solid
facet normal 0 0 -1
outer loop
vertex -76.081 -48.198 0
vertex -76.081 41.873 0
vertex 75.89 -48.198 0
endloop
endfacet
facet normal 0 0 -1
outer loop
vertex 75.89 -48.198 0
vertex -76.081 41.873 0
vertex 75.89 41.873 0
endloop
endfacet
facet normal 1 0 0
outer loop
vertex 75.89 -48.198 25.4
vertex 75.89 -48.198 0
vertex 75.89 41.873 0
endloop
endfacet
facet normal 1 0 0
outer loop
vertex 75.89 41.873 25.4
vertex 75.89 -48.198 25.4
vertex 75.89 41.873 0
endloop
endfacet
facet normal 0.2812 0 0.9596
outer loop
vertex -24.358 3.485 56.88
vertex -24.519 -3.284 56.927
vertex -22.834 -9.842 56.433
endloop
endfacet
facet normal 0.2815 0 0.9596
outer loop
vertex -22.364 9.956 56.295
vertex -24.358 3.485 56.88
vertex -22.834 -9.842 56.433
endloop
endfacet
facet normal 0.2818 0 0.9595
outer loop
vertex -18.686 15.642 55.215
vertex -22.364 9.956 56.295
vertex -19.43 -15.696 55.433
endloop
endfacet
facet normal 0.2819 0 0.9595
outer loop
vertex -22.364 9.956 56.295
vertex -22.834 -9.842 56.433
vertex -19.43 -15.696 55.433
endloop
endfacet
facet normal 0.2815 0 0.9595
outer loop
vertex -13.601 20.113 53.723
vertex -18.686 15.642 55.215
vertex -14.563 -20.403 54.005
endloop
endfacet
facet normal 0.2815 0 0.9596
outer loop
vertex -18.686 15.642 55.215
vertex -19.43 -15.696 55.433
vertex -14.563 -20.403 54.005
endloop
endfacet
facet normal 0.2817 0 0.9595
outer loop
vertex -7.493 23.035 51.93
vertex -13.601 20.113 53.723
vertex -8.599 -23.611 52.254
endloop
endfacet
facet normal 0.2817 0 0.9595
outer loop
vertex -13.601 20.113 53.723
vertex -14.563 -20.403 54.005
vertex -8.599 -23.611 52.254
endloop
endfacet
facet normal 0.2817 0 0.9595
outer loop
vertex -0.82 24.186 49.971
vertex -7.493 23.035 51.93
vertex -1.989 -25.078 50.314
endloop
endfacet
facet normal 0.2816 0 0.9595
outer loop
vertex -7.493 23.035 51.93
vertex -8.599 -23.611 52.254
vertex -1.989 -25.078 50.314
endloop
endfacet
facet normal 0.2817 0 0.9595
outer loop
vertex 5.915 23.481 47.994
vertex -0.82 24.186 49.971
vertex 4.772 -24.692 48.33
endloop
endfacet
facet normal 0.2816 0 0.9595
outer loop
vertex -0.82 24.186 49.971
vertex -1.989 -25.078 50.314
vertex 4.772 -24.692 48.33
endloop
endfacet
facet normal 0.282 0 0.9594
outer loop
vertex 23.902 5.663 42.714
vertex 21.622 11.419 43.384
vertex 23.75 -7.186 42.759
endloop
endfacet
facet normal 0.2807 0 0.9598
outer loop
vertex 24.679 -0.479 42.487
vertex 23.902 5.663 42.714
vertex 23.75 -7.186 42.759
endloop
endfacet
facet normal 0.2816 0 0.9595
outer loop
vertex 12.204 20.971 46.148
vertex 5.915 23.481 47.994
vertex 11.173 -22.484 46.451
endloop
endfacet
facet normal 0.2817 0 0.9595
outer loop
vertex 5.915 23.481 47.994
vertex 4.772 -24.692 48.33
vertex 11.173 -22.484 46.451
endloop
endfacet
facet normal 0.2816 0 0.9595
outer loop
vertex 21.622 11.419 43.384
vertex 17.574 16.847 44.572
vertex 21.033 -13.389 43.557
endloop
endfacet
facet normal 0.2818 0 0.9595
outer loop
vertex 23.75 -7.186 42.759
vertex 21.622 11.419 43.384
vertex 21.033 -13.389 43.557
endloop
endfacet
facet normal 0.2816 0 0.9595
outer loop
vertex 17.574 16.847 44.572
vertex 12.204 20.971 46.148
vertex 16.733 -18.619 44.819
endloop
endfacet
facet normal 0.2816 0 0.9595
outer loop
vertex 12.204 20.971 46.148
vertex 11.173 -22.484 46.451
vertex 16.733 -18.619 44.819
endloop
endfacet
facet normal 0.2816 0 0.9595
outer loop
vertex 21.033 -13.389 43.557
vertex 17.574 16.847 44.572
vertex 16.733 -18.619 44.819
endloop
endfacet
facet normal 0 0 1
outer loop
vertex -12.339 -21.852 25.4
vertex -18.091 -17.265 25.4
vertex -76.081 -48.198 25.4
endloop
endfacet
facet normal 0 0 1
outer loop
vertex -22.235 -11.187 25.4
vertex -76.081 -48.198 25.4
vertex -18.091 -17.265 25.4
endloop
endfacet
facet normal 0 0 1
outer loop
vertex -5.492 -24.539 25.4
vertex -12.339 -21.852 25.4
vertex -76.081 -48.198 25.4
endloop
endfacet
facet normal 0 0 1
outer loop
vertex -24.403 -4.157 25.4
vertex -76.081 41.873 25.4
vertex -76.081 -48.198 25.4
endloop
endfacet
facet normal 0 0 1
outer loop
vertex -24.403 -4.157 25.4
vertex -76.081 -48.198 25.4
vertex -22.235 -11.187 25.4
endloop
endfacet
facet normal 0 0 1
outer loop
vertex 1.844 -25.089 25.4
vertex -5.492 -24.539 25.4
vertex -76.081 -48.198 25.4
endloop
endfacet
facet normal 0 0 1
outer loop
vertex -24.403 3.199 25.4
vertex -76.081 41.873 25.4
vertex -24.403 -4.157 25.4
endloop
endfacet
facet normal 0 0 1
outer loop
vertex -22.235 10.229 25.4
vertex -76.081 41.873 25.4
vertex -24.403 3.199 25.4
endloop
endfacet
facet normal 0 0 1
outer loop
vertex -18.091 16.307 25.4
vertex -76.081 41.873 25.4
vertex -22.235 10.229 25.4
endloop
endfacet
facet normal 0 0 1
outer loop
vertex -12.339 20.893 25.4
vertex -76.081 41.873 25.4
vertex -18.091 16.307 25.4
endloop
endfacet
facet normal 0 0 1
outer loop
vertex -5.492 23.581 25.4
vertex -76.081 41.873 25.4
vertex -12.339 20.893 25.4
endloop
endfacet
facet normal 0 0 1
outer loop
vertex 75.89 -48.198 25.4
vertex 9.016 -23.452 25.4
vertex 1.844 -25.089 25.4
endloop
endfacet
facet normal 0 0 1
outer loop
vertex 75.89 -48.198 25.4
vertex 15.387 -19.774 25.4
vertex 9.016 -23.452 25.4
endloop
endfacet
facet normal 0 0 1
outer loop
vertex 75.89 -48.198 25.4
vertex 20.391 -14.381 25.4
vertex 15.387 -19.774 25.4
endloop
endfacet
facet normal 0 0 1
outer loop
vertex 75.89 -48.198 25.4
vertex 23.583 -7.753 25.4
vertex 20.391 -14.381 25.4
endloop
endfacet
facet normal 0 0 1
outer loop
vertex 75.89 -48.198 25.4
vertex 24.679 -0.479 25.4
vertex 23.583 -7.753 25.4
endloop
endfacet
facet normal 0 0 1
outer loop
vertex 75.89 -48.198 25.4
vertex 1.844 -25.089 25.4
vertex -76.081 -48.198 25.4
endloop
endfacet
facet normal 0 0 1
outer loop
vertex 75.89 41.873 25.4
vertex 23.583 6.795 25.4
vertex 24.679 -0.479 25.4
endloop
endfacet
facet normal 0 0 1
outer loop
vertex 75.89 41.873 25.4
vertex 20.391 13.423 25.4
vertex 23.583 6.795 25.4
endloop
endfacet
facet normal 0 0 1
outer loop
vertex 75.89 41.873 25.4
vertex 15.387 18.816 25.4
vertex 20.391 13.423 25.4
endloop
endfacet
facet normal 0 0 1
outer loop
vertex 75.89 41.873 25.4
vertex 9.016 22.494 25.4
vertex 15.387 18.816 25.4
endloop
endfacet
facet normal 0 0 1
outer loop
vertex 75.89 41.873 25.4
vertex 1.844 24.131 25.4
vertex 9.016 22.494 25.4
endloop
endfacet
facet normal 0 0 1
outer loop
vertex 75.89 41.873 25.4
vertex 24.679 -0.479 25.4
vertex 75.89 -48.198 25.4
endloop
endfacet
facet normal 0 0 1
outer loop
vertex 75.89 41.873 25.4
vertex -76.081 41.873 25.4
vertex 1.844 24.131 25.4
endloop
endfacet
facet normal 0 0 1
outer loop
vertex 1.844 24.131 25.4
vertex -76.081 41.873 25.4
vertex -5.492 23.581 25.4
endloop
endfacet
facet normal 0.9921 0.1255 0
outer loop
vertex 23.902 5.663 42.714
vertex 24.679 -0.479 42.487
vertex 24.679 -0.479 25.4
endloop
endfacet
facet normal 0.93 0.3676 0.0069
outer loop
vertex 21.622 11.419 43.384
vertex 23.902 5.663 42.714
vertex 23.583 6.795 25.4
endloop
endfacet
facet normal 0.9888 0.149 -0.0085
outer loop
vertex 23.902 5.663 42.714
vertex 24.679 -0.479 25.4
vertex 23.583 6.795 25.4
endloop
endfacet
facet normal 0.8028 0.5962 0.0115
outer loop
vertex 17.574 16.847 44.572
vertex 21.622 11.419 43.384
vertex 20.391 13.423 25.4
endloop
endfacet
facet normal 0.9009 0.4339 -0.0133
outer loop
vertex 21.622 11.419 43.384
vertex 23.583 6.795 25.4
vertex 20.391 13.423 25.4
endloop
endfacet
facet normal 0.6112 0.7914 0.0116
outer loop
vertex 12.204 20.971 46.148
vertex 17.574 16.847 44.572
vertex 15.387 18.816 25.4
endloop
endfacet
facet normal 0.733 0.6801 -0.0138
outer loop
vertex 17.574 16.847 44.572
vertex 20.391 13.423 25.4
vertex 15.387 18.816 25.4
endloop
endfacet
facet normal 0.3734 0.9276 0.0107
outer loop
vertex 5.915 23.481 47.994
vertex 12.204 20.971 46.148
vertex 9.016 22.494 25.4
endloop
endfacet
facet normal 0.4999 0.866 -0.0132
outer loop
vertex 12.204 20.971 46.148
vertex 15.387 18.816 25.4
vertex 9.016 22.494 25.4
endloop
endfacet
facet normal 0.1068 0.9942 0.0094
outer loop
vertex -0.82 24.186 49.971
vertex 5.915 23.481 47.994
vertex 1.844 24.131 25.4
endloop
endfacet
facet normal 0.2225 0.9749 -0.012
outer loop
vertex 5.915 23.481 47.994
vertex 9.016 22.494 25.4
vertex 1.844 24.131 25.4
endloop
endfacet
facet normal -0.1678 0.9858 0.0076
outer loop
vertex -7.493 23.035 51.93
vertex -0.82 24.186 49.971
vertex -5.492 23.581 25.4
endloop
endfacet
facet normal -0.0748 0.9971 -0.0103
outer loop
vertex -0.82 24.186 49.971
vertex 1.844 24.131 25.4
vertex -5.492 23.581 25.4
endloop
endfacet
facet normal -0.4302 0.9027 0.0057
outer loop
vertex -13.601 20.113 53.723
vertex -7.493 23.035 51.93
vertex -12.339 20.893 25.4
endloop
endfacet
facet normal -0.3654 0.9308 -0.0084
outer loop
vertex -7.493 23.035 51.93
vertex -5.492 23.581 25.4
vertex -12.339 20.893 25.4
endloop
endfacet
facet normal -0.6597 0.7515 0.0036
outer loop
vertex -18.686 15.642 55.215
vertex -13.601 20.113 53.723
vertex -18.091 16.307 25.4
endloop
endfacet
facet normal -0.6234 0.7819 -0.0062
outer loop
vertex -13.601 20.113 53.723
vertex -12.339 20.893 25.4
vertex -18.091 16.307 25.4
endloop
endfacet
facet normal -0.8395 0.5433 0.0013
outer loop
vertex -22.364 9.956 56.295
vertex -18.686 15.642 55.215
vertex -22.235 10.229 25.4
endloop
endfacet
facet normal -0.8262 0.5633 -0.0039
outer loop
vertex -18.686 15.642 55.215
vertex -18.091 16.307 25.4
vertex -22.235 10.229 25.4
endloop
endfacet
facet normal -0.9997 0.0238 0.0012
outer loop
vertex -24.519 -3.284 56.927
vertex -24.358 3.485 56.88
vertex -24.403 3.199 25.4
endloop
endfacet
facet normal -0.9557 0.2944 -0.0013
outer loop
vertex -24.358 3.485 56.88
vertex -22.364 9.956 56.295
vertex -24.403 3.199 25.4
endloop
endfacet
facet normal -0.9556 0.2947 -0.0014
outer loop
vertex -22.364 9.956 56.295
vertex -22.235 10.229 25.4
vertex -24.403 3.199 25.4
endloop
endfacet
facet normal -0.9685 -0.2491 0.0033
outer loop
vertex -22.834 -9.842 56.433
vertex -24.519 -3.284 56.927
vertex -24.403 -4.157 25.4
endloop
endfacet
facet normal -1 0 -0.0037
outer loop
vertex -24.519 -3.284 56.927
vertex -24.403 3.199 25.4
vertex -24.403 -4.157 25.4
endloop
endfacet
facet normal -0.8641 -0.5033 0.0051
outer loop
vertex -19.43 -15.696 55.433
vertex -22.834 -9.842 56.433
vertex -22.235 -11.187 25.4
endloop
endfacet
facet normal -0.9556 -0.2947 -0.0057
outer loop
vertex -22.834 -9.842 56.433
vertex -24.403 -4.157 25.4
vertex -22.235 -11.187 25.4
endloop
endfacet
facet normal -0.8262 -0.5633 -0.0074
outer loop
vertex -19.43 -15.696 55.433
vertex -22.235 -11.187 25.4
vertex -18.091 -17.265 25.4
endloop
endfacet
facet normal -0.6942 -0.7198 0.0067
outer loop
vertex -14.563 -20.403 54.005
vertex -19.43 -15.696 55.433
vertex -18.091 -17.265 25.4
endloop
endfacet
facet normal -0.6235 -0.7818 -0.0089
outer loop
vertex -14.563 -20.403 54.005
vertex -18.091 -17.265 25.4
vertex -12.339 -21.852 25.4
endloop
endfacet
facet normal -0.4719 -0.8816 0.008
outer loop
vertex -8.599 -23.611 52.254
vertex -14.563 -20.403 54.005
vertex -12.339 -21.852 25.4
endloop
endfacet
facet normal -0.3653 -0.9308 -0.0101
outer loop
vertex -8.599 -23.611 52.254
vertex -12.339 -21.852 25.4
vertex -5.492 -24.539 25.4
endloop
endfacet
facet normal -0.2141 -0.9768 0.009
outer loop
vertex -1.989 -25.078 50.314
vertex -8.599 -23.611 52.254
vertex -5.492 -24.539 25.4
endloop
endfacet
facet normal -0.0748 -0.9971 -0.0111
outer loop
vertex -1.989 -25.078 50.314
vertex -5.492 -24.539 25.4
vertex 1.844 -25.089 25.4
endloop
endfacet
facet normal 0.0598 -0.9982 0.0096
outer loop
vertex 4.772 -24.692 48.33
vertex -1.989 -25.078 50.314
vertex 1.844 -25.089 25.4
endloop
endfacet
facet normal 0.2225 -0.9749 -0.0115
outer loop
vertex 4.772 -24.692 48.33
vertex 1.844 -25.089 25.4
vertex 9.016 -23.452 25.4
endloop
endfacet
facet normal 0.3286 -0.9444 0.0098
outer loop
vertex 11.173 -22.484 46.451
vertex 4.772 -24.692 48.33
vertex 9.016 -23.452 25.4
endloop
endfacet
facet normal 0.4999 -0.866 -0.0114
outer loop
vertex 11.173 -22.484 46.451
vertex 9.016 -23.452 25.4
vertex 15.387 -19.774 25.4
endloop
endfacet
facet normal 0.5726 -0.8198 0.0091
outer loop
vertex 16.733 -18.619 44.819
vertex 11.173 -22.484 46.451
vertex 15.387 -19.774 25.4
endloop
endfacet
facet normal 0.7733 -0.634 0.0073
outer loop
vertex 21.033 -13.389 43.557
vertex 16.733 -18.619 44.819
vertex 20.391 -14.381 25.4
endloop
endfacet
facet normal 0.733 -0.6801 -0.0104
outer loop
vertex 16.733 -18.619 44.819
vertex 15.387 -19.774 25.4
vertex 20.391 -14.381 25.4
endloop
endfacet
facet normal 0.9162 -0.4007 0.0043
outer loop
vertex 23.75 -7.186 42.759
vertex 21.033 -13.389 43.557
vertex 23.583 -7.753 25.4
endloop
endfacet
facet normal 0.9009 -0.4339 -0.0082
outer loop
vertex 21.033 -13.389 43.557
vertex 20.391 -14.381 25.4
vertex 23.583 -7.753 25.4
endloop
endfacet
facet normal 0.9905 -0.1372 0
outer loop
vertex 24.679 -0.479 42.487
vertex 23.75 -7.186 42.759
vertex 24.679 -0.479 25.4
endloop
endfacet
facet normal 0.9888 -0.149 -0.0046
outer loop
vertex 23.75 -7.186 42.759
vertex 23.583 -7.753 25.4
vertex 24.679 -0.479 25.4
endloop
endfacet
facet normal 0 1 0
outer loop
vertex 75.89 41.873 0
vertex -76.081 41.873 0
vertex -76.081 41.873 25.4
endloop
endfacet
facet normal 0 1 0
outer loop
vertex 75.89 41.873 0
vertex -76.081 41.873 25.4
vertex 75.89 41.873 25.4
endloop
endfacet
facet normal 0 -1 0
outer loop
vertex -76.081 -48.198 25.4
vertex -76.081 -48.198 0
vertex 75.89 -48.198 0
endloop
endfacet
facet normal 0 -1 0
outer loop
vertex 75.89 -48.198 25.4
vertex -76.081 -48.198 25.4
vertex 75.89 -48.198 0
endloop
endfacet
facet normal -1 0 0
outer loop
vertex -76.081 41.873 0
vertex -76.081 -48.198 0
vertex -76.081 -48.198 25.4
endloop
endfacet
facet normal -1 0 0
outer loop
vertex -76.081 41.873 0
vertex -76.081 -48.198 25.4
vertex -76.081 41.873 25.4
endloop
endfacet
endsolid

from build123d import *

# Parameters (mm, degrees)
F0_W     = 151.971087
F0_H     = 90.071138
F1_DEPTH = 25.4
F2_R     = 24.678934
F3_DEPTH = 38.1
F5_DEPTH = 90.072138


with BuildPart() as f1:
    # F0 (on Top) → F1 (new body)
    with BuildSketch(Plane.XY):
        with Locations((-0.095821, -3.162073)):
            Rectangle(F0_W, F0_H)
    extrude(amount=F1_DEPTH)

    # F2 (on face) → F3 (join)
    with BuildSketch(Plane.XY.offset(25.4)):
        with Locations((0, -0.479101)):
            Circle(F2_R)
    extrude(amount=F3_DEPTH)

    # F4 (on face) → F5 (cut, through all)
    with BuildSketch(Plane.XZ.offset(48.197642)):
        Polygon((29.129392, 74.644059), (-56.150731, 66.211872), (38.519785, 38.423963), align=None)
    extrude(amount=-F5_DEPTH, mode=Mode.SUBTRACT)


solid = f1.part
